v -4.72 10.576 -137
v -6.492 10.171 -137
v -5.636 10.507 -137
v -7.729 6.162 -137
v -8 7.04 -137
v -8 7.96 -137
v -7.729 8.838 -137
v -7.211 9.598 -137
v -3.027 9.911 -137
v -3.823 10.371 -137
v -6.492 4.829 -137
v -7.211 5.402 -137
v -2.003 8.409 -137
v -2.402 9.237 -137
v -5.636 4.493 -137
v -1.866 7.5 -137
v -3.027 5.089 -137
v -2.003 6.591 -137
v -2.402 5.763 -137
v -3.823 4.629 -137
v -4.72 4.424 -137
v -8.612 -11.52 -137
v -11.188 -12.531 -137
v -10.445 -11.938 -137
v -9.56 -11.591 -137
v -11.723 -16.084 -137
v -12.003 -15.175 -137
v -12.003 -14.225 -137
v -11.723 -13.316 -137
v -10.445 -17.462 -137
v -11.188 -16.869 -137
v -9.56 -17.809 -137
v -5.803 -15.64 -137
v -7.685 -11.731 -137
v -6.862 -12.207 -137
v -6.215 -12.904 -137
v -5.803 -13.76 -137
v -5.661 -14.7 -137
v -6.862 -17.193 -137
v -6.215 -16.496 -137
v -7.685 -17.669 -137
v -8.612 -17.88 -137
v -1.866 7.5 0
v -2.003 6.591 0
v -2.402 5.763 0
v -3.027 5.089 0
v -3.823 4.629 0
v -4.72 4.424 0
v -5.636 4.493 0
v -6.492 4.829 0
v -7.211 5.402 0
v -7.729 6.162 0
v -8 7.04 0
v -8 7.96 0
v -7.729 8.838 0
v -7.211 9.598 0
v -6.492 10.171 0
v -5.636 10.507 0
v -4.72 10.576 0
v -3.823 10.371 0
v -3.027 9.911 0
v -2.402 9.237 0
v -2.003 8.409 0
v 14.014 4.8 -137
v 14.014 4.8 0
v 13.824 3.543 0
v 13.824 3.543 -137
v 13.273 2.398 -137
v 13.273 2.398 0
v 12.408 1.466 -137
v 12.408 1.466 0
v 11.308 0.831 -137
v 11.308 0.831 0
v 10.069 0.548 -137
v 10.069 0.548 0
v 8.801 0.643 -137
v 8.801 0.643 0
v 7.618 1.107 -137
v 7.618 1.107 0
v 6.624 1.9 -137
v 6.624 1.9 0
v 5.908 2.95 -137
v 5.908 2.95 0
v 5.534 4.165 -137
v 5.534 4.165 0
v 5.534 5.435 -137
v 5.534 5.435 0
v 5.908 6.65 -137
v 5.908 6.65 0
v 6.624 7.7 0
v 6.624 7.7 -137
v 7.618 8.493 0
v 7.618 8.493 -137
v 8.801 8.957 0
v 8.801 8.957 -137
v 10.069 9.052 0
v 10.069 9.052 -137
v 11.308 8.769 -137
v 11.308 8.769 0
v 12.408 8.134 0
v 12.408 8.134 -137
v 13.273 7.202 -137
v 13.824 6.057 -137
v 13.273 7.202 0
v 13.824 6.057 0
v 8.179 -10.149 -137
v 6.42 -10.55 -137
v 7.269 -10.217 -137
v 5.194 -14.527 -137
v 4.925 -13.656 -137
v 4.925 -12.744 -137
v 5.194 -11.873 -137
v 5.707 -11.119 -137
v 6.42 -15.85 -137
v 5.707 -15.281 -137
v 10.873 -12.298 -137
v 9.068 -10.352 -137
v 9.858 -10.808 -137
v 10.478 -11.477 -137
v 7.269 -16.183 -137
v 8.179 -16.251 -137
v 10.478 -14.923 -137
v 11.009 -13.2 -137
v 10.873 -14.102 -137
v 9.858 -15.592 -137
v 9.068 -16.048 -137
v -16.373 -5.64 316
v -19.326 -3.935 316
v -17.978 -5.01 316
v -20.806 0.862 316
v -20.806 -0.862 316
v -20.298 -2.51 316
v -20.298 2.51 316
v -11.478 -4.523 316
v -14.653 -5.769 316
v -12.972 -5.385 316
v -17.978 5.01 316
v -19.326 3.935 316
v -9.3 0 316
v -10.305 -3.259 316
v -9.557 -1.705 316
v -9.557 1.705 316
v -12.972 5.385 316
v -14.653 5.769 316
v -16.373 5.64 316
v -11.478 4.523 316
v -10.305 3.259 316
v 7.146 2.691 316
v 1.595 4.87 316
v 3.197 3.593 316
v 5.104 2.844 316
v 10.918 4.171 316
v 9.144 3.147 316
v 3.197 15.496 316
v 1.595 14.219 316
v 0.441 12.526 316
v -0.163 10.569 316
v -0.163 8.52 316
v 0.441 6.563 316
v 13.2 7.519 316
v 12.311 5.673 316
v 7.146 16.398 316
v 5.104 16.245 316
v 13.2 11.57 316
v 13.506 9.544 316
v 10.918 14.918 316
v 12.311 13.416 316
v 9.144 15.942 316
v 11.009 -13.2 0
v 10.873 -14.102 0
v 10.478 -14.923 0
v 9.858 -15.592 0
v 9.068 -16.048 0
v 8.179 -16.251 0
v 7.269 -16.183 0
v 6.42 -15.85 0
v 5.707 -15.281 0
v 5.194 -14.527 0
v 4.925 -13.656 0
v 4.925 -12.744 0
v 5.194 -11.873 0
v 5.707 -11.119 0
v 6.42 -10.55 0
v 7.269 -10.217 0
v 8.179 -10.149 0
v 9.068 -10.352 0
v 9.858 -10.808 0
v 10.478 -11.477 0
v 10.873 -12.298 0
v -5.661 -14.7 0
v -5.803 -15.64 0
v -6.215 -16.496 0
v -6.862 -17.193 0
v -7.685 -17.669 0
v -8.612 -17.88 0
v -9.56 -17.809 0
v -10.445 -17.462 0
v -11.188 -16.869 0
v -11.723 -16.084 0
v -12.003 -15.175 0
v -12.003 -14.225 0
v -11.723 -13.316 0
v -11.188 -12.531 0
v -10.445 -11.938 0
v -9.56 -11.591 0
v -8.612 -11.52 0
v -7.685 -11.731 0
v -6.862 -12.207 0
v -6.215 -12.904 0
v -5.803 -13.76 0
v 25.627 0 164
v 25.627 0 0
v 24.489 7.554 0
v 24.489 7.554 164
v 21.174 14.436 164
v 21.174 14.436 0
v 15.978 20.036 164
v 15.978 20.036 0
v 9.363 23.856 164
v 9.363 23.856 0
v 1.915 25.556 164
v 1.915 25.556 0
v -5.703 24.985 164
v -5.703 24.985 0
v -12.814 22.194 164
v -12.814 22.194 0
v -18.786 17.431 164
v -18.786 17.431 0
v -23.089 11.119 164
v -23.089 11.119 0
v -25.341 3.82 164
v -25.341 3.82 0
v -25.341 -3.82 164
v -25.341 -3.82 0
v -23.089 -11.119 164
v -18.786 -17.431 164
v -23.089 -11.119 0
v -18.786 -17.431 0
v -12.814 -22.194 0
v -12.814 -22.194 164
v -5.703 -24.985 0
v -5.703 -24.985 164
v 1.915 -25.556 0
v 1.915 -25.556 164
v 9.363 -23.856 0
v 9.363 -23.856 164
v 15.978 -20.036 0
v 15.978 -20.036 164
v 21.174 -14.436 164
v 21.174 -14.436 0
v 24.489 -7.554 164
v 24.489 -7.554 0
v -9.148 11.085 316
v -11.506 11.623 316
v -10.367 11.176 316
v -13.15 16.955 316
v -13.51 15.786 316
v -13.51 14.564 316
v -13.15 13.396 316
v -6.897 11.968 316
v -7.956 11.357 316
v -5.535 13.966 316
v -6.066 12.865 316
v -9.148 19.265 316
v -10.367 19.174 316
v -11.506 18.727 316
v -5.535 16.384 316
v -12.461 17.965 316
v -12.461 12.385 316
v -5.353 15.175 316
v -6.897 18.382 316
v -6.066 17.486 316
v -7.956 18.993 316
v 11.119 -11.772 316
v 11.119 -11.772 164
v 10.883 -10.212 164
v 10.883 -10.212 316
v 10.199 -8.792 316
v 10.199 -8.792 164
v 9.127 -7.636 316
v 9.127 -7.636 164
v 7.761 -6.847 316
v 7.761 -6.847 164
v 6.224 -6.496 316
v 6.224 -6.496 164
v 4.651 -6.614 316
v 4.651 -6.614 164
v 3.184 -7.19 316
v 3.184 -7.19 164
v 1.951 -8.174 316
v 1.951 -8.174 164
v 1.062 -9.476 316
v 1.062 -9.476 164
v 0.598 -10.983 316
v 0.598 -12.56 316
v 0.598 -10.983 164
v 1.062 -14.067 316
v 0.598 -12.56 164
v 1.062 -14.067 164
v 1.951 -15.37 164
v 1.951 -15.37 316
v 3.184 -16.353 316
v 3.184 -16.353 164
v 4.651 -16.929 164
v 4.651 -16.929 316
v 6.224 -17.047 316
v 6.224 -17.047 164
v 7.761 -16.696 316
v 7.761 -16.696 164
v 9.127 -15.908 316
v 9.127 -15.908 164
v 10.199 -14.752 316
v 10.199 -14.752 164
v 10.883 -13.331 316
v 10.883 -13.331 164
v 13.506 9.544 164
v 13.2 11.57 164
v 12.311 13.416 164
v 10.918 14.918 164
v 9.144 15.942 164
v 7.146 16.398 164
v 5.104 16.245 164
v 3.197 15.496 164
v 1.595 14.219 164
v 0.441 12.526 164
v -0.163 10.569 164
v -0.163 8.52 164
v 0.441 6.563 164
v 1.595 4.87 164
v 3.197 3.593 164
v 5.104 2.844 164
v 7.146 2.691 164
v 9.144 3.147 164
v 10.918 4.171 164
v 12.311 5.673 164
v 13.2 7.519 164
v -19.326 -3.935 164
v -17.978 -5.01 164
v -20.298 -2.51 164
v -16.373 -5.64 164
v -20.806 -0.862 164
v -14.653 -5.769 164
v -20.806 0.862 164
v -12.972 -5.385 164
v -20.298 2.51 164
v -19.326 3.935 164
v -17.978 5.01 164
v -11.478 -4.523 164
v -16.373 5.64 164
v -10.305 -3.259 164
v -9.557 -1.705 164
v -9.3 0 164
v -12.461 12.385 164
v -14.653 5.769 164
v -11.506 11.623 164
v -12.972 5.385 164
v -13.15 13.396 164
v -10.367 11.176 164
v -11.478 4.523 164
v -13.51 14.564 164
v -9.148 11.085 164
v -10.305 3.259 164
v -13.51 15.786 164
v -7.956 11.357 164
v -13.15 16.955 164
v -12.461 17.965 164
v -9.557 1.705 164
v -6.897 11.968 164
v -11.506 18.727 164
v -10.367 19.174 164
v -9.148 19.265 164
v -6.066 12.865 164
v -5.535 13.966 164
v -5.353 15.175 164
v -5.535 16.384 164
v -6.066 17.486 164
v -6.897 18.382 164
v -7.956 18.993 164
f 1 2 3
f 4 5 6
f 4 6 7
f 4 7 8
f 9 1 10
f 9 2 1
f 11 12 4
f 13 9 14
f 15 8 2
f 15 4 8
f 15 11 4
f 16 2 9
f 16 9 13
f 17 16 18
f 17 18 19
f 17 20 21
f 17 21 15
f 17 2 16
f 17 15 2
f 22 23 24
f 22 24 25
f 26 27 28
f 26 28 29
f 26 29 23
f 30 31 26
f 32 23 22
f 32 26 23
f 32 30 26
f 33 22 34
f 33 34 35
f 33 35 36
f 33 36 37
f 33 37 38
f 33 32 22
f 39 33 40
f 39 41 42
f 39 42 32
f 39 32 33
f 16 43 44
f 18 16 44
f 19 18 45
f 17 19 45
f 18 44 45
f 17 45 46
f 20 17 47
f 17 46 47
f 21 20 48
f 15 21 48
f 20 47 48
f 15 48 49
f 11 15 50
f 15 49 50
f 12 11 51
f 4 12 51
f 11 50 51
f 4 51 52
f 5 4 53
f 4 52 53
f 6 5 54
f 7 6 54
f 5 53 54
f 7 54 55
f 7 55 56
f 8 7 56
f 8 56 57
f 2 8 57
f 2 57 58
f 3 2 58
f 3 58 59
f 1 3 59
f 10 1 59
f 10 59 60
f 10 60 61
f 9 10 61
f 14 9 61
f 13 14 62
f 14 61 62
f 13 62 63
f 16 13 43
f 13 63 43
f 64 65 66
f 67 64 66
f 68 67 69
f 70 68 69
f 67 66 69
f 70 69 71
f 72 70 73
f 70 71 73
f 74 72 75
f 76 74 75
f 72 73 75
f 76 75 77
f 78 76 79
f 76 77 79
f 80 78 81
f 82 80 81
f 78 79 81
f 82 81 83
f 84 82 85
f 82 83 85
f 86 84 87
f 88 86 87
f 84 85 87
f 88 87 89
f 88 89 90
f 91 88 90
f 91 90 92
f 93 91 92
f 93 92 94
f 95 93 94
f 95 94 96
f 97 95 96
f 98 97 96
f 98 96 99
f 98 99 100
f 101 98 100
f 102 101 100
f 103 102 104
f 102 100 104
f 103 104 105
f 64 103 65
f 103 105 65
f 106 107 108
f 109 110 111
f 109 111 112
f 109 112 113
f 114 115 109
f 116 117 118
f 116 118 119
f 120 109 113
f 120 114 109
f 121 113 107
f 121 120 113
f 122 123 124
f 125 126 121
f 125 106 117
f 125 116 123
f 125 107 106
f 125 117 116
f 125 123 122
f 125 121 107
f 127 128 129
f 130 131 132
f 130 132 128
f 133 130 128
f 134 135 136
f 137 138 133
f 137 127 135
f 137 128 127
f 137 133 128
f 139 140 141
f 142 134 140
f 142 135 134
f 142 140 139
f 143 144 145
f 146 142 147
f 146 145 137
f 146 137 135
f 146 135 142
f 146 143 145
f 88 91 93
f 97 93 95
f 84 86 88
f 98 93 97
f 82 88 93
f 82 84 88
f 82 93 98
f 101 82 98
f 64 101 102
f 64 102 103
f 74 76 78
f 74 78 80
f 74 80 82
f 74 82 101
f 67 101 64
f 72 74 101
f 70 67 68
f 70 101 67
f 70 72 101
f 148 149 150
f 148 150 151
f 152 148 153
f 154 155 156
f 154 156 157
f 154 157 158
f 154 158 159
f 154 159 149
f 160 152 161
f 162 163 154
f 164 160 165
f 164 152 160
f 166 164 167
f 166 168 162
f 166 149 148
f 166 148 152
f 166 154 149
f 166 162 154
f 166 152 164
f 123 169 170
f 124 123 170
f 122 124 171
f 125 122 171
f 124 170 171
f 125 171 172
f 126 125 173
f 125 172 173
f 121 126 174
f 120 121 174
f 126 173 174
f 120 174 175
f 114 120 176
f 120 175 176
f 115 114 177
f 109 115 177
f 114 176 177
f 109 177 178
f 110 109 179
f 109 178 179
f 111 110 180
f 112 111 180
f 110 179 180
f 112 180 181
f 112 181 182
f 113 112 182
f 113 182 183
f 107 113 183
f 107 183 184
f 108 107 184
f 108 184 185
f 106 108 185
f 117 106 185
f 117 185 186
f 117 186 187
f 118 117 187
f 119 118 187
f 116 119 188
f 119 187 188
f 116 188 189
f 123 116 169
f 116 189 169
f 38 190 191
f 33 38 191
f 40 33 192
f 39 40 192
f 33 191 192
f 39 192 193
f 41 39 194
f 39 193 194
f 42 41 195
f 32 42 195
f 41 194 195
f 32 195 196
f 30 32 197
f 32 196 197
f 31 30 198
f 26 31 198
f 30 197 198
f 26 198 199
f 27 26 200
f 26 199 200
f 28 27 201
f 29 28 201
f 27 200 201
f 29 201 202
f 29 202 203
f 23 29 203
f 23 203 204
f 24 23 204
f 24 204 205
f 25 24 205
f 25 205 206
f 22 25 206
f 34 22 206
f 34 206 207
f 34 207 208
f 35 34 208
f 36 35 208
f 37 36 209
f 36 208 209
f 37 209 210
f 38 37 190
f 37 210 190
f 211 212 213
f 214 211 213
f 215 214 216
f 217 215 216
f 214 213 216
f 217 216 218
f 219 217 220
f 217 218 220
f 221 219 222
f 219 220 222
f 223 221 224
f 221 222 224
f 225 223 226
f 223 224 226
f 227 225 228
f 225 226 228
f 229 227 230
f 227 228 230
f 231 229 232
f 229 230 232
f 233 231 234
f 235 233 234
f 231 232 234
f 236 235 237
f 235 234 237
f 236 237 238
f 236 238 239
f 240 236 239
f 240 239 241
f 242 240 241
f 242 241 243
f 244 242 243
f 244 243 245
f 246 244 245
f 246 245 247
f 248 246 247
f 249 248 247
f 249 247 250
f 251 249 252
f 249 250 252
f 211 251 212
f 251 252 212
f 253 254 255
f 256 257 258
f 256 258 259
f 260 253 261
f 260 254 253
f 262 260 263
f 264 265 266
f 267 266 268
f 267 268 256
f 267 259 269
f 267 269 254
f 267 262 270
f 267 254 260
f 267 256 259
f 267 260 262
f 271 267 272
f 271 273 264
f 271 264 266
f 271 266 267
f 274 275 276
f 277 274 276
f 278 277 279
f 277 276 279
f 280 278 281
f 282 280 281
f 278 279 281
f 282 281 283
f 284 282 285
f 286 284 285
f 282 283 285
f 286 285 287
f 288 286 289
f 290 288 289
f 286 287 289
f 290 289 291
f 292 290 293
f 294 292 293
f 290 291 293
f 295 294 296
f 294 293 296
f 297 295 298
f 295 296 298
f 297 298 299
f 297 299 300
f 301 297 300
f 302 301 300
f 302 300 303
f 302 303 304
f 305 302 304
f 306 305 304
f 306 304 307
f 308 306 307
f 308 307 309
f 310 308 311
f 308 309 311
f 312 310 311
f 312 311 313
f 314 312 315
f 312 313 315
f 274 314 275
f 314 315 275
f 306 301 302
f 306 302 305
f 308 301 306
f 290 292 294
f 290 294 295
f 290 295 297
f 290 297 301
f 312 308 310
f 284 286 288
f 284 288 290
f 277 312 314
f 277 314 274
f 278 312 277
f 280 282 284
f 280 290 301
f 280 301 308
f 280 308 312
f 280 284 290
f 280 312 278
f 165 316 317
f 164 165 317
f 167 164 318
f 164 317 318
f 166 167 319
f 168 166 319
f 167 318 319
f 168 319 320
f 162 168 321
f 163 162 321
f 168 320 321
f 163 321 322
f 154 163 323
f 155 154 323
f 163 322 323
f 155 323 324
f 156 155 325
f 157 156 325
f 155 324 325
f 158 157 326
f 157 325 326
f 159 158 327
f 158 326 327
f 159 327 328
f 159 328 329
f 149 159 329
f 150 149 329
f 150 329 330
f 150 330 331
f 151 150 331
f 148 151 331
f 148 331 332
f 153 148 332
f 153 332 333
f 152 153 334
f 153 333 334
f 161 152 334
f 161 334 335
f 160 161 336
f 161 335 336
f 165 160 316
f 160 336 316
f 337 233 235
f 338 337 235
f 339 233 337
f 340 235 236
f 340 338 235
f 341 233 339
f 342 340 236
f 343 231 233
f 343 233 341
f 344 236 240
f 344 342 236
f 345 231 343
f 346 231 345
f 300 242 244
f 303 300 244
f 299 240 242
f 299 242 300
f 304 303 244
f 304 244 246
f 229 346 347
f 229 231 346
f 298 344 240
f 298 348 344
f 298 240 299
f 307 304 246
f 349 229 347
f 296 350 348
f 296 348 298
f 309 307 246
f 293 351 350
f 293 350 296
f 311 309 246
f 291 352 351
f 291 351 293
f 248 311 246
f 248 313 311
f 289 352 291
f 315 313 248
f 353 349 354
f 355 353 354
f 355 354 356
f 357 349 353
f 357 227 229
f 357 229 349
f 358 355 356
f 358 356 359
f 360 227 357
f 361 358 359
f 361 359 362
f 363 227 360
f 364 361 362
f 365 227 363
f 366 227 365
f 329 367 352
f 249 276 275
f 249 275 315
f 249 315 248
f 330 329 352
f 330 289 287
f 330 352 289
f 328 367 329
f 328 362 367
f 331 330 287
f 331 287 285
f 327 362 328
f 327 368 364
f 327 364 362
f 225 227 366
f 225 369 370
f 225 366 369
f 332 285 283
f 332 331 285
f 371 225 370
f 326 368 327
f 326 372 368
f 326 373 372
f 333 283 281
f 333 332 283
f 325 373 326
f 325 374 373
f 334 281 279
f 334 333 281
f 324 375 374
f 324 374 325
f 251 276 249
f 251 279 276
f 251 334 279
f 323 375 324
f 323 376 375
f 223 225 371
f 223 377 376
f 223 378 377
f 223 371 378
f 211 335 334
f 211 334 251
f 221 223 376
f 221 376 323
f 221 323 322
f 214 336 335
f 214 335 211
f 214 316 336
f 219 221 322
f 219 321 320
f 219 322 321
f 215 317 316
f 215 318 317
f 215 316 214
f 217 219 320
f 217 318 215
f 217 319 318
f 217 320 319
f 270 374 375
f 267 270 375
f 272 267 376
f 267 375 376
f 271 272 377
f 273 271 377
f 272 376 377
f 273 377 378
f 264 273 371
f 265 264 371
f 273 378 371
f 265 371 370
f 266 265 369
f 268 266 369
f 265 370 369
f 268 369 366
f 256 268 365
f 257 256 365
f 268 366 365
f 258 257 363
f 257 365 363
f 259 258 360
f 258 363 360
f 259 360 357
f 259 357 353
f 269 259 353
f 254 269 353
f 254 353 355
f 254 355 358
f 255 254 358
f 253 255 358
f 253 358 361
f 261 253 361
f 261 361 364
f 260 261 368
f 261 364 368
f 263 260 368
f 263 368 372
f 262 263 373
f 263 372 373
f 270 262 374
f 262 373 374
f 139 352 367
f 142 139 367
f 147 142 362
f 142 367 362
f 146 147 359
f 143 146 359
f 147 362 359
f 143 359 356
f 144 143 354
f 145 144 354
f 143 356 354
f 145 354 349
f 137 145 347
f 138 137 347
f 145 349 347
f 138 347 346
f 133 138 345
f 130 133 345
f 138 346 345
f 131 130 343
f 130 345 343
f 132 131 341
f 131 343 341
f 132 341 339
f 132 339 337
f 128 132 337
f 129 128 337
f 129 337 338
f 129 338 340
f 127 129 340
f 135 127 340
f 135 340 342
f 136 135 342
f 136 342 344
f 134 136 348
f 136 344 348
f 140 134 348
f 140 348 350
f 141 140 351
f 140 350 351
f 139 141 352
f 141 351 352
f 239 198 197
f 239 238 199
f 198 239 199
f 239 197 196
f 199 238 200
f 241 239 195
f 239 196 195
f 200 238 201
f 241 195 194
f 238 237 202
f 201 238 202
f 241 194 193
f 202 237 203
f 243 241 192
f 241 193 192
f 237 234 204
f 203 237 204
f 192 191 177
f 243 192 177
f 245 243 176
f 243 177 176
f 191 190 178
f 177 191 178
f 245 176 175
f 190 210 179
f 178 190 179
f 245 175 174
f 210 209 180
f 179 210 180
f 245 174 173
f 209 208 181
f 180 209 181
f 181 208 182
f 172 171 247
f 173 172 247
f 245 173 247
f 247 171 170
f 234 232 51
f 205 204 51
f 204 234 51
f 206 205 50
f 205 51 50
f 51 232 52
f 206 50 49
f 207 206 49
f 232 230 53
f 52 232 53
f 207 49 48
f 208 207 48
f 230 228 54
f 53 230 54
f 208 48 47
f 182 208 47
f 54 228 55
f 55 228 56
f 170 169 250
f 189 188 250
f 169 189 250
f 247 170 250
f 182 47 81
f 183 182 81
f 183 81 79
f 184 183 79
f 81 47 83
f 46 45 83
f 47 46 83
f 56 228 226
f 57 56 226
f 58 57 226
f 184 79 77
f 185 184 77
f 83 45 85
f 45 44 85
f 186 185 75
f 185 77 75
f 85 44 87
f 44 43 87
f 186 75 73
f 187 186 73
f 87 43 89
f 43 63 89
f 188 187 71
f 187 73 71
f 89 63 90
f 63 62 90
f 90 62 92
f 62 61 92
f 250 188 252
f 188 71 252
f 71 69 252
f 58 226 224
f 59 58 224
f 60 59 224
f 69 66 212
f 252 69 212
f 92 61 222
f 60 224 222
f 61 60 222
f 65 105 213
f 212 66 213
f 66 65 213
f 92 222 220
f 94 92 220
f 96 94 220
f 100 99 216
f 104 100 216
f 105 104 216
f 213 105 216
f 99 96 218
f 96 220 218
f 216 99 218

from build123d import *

# Parameters (mm, degrees)
F0_R     = 25.627184
F1_DEPTH = 164
F2_R     = 3.189044
F2_R_2   = 3.059411
F2_R_3   = 4.263801
F2_R_4   = 3.084232
F3_DEPTH = 137
F4_R     = 4.101554
F4_R_2   = 6.872634
F4_R_3   = 5.28999
F4_R_4   = 5.785283
F5_DEPTH = 152


with BuildPart() as f1:
    # F0 (on Top) → F1 (new body)
    with BuildSketch(Plane.XY):
        Circle(F0_R)
    extrude(amount=F1_DEPTH)

    # F2 (on face) → F3 (join)
    with BuildSketch(Plane(origin=(0, 0, 0), x_dir=(1, 0, 0), z_dir=(0, 0, -1))):
        with Locations((-8.850001, 14.700001)):
            Circle(F2_R)
        with Locations((7.950001, 13.200001)):
            Circle(F2_R_2)
        with Locations((9.750001, -4.8)):
            Circle(F2_R_3)
        with Locations((-4.950002, -7.5)):
            Circle(F2_R_4)
    extrude(amount=F3_DEPTH)

    # F4 (on face) → F5 (join)
    with BuildSketch(Plane.XY.offset(164)):
        with Locations((-9.454723, 15.175114)):
            Circle(F4_R)
        with Locations((6.632895, 9.544446)):
            Circle(F4_R_2)
        with Locations((5.828514, -11.771653)):
            Circle(F4_R_3)
        with Locations((-15.085398, 0)):
            Circle(F4_R_4)
    extrude(amount=F5_DEPTH)


solid = f1.part
